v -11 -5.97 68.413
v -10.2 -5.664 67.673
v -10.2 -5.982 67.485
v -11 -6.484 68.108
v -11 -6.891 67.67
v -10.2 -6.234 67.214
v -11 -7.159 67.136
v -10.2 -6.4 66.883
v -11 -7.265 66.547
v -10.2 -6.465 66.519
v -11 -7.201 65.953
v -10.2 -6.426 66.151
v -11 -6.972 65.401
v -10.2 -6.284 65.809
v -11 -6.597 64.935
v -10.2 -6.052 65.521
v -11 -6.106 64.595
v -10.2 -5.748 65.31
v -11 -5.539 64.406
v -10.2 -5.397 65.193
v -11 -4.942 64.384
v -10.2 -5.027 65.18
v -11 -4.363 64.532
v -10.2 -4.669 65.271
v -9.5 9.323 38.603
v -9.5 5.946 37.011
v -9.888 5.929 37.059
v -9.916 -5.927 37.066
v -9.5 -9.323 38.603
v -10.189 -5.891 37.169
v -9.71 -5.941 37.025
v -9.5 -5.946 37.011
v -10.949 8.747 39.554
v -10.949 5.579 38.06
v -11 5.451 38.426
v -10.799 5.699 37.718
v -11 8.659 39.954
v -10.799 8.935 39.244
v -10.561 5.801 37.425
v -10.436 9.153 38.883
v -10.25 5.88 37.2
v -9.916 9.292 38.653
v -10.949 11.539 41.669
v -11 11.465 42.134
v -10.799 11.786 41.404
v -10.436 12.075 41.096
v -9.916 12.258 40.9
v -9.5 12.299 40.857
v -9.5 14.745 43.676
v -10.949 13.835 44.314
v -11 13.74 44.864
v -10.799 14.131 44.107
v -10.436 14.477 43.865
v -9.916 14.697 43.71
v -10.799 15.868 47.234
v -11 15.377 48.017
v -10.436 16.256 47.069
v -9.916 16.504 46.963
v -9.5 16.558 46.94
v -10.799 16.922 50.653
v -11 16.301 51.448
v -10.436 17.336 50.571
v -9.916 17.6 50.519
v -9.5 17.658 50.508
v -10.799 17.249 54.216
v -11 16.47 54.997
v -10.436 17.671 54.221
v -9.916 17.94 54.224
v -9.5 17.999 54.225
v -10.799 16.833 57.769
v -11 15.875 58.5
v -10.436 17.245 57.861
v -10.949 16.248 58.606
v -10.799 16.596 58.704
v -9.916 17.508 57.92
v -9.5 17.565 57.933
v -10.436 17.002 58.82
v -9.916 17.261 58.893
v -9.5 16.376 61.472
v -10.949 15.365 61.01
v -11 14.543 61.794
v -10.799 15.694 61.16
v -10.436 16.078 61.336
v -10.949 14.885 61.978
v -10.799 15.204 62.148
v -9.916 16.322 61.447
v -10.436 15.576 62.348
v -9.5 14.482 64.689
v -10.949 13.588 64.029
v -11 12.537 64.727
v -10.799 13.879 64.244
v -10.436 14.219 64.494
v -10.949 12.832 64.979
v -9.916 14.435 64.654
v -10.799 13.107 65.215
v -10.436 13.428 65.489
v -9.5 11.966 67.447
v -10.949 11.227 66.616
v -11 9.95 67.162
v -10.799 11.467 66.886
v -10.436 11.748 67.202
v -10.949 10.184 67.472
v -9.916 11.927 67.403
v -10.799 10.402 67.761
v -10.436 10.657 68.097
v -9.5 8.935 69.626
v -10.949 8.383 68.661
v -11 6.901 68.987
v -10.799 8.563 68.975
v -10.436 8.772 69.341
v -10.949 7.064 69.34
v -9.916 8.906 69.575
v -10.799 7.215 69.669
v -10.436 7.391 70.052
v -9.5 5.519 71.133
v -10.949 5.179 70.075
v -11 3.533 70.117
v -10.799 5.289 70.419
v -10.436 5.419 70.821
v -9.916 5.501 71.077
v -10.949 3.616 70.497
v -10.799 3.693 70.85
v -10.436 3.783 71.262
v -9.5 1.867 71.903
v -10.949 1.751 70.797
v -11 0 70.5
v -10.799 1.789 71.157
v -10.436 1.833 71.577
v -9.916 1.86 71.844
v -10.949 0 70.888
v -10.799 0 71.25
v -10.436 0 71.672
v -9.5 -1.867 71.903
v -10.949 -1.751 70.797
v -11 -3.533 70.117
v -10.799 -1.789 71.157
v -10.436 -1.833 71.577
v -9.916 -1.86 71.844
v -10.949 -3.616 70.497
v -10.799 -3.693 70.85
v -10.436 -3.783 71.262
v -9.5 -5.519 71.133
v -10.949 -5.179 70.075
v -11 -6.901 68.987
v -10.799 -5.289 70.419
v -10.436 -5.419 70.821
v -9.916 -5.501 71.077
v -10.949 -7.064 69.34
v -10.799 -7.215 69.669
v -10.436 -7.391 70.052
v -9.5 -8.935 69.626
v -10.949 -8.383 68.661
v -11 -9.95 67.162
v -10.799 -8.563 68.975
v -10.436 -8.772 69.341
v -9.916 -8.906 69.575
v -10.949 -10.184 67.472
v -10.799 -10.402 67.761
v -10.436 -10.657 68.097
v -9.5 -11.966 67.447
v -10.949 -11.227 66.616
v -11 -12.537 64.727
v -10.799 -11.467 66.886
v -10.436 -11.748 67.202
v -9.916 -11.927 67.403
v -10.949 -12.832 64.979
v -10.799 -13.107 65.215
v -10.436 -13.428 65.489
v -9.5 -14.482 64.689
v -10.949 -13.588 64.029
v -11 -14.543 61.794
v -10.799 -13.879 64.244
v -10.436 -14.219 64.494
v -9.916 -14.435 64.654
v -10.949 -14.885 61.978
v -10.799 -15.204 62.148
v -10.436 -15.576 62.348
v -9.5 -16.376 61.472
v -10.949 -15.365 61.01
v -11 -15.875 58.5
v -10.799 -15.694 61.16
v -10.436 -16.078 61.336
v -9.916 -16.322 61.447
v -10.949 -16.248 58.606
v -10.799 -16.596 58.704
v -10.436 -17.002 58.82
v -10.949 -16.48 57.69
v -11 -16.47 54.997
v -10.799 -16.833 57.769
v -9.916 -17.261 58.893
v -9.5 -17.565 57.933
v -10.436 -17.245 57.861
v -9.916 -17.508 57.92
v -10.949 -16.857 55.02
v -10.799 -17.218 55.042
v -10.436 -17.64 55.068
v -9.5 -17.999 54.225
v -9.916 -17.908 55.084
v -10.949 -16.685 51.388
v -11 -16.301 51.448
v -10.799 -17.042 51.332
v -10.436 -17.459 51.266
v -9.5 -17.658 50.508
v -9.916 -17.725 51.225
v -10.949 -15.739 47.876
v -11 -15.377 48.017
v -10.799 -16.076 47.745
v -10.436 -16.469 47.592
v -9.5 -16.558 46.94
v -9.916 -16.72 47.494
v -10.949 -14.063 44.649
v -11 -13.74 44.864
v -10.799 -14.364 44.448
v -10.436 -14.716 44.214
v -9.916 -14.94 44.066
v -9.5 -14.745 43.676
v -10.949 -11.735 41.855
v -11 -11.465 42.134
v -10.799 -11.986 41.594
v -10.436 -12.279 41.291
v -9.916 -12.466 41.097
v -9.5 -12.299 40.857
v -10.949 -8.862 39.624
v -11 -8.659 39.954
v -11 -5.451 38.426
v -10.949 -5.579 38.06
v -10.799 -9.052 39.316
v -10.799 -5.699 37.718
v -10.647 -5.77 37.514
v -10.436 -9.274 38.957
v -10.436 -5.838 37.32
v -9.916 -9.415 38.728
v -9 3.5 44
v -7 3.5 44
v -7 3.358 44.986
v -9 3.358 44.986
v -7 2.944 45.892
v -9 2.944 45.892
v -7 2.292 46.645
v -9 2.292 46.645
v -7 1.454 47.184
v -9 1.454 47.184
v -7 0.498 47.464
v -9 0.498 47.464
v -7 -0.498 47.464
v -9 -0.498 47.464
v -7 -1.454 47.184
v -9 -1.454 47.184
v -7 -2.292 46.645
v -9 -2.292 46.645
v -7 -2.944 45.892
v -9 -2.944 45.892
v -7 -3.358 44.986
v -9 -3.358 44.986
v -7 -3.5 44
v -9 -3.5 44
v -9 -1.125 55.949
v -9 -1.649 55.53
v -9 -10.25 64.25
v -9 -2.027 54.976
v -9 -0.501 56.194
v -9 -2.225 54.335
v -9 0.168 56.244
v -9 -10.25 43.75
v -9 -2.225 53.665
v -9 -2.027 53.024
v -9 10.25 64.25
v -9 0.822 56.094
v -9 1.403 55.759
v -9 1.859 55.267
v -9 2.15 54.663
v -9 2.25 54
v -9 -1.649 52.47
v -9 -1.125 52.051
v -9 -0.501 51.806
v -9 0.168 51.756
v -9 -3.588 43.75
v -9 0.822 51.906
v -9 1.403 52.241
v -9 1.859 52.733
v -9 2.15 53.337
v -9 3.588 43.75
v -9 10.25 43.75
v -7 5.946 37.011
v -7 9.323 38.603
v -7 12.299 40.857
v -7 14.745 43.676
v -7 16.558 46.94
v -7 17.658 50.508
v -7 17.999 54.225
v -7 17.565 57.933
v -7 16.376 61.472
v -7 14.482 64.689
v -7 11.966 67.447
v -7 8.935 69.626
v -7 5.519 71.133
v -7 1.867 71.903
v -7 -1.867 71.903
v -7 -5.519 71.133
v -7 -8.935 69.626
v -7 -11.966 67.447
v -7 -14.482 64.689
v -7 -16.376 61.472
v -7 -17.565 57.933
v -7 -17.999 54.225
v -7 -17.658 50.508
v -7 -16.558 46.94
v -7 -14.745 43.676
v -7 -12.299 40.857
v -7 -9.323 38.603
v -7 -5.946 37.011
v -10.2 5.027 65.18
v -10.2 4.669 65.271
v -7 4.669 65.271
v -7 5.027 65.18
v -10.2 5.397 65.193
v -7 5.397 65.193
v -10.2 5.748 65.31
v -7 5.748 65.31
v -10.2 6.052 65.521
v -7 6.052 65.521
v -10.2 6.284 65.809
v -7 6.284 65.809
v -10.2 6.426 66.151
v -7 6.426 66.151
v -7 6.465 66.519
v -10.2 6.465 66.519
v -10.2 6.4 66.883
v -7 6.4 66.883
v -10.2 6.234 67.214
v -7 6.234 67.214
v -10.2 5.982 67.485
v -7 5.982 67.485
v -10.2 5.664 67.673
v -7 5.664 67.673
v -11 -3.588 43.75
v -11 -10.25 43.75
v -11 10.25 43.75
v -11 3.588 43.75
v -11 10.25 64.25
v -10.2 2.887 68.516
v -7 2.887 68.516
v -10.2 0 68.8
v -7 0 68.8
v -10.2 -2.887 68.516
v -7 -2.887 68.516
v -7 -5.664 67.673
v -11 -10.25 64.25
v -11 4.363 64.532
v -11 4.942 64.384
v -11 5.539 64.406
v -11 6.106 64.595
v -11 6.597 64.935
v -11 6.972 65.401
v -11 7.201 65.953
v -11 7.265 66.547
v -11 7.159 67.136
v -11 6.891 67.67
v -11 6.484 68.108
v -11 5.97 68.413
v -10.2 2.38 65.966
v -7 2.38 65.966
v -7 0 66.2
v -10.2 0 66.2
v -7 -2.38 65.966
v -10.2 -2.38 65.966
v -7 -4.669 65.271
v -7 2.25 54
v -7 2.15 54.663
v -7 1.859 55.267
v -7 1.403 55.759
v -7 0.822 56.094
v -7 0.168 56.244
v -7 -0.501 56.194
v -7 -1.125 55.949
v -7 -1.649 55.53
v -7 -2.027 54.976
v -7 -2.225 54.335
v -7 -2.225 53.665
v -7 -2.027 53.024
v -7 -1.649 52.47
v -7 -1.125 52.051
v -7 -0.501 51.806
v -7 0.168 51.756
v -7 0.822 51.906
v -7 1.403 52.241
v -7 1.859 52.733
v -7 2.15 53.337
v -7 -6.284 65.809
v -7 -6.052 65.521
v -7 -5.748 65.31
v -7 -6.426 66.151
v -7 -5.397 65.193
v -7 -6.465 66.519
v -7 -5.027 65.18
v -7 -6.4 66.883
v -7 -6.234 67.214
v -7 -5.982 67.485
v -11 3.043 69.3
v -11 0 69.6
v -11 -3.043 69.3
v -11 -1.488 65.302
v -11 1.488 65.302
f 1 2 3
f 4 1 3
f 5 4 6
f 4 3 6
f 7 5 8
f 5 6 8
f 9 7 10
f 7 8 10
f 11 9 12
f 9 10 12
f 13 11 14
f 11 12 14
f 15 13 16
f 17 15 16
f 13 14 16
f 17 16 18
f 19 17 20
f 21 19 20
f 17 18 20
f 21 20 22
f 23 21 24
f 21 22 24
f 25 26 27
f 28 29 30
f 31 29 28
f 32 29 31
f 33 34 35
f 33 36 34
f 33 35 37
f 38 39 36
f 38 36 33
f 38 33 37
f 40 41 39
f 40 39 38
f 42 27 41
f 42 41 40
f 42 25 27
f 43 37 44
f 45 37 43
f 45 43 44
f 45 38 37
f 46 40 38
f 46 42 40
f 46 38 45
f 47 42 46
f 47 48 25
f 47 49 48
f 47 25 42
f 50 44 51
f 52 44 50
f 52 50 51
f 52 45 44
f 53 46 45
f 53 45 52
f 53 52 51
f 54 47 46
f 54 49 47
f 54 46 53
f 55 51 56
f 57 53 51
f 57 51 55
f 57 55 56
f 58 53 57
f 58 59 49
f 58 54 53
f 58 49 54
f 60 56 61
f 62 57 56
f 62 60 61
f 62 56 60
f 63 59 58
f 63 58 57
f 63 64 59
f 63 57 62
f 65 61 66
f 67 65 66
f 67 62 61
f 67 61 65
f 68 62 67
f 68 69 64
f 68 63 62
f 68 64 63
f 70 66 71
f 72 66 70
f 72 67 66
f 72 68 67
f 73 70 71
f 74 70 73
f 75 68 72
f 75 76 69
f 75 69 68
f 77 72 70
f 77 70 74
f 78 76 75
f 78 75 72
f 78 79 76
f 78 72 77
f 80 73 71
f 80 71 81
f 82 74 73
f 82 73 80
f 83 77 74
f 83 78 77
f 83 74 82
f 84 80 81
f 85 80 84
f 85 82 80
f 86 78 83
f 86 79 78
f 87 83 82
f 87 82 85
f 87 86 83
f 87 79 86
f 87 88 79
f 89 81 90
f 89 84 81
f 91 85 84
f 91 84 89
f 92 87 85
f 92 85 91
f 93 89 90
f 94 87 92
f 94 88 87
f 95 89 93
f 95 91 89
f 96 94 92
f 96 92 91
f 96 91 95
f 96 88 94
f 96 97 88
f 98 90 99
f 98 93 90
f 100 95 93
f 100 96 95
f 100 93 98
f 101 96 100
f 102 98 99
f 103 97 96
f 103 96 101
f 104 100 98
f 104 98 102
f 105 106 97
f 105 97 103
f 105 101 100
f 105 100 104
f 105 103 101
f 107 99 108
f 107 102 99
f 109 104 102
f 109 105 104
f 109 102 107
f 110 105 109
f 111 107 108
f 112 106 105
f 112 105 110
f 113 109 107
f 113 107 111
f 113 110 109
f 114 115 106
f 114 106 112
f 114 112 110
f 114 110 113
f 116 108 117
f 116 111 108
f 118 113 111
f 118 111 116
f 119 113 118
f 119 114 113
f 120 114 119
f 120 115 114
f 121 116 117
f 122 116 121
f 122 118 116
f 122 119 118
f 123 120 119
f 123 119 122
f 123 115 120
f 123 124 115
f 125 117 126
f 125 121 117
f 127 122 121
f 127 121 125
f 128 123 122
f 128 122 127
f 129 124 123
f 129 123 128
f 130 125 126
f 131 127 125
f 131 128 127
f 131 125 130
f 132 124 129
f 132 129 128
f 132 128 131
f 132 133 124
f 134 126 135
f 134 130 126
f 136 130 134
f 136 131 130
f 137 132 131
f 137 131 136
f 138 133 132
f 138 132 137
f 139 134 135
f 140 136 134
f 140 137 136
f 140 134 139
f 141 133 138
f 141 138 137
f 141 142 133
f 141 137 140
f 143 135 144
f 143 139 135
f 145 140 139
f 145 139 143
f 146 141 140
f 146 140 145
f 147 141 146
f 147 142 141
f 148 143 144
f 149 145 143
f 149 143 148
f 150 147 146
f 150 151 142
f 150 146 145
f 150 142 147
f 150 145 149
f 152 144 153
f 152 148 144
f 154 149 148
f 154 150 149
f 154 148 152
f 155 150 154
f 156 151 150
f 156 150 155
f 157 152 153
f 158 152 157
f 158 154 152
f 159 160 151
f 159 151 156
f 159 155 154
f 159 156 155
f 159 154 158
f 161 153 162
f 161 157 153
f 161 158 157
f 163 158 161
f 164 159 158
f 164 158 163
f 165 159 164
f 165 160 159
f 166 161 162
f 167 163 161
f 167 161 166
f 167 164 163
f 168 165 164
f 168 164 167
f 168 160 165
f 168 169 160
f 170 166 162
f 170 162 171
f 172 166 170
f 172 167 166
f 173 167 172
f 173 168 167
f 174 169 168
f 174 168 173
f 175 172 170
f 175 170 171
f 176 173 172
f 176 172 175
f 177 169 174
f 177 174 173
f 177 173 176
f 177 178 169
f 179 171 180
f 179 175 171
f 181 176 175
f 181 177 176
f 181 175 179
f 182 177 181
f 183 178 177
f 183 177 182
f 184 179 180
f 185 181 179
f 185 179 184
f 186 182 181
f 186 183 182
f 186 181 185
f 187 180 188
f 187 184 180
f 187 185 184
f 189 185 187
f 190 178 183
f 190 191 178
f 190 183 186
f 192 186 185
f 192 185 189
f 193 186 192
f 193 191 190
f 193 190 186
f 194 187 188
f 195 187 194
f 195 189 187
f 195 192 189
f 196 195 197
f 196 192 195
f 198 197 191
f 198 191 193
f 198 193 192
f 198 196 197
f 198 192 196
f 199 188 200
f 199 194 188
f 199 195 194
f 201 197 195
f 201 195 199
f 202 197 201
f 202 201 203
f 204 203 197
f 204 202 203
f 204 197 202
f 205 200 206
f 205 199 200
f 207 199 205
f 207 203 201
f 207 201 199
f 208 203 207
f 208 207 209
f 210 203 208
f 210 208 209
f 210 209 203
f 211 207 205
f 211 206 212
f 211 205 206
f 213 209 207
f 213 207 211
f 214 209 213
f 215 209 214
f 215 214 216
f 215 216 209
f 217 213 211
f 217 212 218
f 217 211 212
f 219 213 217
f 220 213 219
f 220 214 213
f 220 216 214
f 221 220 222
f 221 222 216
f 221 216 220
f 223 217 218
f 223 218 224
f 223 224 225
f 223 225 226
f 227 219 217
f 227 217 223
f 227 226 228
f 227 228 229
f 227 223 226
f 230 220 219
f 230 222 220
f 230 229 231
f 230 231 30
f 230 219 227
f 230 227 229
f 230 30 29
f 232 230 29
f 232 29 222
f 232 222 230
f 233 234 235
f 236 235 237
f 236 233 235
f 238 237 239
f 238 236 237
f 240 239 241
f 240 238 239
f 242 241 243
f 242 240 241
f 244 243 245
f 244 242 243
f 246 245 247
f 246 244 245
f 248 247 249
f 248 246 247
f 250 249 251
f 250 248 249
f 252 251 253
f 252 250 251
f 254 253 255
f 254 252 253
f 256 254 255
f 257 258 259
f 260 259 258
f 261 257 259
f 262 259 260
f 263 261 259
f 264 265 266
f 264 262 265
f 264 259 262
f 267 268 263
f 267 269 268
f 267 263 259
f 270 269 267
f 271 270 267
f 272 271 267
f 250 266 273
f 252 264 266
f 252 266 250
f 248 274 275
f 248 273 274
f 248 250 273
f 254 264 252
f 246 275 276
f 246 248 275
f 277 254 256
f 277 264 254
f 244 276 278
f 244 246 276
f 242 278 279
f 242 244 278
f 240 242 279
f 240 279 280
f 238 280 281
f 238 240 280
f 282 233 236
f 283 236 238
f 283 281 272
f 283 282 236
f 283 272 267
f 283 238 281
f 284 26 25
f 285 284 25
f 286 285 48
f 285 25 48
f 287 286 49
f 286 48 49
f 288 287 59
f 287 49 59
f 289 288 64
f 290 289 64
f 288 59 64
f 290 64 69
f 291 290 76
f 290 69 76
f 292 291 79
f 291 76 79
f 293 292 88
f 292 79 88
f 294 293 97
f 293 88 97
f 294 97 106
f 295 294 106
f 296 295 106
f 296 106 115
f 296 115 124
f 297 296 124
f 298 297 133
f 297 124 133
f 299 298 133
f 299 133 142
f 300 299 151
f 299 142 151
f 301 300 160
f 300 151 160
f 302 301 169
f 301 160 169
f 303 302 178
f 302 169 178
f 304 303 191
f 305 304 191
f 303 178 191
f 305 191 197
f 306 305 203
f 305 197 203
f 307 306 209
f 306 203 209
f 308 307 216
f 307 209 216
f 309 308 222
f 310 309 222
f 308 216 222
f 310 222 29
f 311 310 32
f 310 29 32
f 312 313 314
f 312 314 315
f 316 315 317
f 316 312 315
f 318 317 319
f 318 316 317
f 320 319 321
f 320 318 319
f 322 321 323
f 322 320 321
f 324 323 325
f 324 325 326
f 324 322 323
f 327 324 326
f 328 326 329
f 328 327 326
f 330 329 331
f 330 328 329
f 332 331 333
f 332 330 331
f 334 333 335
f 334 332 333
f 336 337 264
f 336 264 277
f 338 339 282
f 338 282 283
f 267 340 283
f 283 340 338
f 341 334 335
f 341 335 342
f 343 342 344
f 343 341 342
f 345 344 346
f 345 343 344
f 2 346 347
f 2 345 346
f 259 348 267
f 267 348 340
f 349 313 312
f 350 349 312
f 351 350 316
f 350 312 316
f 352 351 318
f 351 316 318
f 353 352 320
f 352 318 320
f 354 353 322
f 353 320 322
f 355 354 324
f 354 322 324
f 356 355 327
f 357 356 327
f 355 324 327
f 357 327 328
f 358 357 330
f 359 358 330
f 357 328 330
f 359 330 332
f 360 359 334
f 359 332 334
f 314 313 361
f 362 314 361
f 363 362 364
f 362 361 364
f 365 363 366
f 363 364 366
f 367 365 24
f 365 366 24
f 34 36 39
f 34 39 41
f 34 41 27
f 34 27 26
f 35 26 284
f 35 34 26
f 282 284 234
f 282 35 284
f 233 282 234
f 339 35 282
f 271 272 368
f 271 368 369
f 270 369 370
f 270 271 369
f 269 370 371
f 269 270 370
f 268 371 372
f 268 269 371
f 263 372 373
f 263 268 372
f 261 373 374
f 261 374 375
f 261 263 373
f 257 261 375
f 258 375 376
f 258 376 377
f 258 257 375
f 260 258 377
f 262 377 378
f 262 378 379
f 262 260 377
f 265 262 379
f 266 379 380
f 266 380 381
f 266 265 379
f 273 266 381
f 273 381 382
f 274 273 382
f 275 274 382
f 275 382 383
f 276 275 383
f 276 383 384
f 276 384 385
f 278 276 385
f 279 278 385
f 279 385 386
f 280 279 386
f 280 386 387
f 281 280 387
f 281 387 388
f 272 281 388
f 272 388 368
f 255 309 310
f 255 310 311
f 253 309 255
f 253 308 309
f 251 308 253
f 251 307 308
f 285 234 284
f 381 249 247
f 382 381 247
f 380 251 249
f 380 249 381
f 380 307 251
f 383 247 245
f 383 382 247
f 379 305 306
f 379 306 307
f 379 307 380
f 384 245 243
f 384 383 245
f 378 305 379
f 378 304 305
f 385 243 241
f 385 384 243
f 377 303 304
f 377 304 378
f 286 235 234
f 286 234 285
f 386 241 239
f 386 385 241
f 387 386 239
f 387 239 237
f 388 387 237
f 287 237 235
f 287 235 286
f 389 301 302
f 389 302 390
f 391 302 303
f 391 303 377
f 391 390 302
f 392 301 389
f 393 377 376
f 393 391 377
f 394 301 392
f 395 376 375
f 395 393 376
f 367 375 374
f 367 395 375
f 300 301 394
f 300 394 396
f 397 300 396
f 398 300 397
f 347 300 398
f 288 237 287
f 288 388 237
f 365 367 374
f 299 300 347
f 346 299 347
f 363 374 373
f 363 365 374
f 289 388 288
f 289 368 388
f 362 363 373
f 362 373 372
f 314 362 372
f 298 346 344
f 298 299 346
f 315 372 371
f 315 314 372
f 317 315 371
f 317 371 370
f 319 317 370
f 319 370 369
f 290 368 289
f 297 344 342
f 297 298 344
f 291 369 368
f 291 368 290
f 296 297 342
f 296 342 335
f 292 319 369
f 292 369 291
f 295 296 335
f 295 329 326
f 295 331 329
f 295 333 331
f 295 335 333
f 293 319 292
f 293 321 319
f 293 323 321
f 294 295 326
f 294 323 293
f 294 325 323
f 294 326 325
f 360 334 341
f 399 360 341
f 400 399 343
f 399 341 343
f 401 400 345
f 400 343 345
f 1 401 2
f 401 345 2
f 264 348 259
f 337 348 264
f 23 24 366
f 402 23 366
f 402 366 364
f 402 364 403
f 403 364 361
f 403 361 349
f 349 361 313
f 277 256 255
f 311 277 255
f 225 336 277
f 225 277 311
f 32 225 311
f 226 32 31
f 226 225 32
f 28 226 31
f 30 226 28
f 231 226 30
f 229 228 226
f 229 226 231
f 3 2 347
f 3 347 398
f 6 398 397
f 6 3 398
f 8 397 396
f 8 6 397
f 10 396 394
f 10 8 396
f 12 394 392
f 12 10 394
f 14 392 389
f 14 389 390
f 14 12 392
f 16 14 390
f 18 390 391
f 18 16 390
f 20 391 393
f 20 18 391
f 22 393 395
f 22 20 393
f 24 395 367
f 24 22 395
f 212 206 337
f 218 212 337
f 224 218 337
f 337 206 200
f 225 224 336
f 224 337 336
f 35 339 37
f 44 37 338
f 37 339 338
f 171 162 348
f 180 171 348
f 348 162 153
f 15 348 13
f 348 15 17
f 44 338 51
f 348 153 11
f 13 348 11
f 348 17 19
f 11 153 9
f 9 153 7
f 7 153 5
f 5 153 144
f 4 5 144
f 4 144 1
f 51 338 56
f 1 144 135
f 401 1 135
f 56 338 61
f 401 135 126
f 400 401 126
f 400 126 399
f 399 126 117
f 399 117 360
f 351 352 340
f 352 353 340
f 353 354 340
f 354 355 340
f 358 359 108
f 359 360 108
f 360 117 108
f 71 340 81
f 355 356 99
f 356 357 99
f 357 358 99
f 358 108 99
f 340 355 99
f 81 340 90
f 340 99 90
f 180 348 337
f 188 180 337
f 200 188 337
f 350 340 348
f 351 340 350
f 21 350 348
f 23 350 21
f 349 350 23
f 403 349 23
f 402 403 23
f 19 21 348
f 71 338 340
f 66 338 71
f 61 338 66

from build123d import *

# Parameters (mm, degrees)
SKETCH176_R     = 2.25
PAD098_DEPTH    = 4
SKETCH177_W     = 20.5
SKETCH177_H     = 20.5
POCKET040_DEPTH = 2
CHAMFER002_SIZE = 0.8
FILLET008_R     = 1.5


with BuildPart() as part:
    # Sketch176 → Pad098 (new body)
    with BuildSketch(Plane.YZ):
        with BuildLine():
            ThreePointArc((5.946308, -16.98945), (0, 18), (-5.946308, -16.98945))
            Line((-3.5, -10), (-5.946308, -16.98945))
            ThreePointArc((3.5, -10), (0, -6.5), (-3.5, -10))
            Line((5.946308, -16.98945), (3.5, -10))
        make_face()
        Circle(SKETCH176_R, mode=Mode.SUBTRACT)
        with BuildLine():
            ThreePointArc((-5.663715, 13.673417), (-6.36727, 11.974885), (-4.668738, 11.27133))
            ThreePointArc((4.668738, 11.27133), (0, 12.2), (-4.668738, 11.27133))
            ThreePointArc((4.668738, 11.27133), (6.36727, 11.974885), (5.663715, 13.673417))
            ThreePointArc((5.663715, 13.673417), (0, 14.8), (-5.663715, 13.673417))
        make_face(mode=Mode.SUBTRACT)
    extrude(amount=PAD098_DEPTH)

    # Sketch177 (on Face10 of Pad098) → Pocket040 (cut)
    with BuildSketch(Plane(origin=(0, 0, 0), x_dir=(0, 1, 0), z_dir=(-1, 0, 0))):
        Rectangle(SKETCH177_W, SKETCH177_H)
    extrude(amount=-POCKET040_DEPTH, mode=Mode.SUBTRACT)

    # Chamfer002
    chamfer002_edges = [part.edges().sort_by_distance(p)[0] for p in [
        (0, 6.36727, 11.974885),
        (0, 0, 14.8),
        (0, 0, 12.2),
        (0, -6.36727, 11.974885),
    ]]
    chamfer(chamfer002_edges, length=CHAMFER002_SIZE)

    # Fillet008
    fillet008_edges = [part.edges().sort_by_distance(p)[0] for p in [
        (0, 0, 18),
    ]]
    fillet(fillet008_edges, radius=FILLET008_R)


with BuildPart() as part_1:
    # Body140 placement: moved
    add(part.part.moved(Location((-11, 0, 54))))


solid = part_1.part
